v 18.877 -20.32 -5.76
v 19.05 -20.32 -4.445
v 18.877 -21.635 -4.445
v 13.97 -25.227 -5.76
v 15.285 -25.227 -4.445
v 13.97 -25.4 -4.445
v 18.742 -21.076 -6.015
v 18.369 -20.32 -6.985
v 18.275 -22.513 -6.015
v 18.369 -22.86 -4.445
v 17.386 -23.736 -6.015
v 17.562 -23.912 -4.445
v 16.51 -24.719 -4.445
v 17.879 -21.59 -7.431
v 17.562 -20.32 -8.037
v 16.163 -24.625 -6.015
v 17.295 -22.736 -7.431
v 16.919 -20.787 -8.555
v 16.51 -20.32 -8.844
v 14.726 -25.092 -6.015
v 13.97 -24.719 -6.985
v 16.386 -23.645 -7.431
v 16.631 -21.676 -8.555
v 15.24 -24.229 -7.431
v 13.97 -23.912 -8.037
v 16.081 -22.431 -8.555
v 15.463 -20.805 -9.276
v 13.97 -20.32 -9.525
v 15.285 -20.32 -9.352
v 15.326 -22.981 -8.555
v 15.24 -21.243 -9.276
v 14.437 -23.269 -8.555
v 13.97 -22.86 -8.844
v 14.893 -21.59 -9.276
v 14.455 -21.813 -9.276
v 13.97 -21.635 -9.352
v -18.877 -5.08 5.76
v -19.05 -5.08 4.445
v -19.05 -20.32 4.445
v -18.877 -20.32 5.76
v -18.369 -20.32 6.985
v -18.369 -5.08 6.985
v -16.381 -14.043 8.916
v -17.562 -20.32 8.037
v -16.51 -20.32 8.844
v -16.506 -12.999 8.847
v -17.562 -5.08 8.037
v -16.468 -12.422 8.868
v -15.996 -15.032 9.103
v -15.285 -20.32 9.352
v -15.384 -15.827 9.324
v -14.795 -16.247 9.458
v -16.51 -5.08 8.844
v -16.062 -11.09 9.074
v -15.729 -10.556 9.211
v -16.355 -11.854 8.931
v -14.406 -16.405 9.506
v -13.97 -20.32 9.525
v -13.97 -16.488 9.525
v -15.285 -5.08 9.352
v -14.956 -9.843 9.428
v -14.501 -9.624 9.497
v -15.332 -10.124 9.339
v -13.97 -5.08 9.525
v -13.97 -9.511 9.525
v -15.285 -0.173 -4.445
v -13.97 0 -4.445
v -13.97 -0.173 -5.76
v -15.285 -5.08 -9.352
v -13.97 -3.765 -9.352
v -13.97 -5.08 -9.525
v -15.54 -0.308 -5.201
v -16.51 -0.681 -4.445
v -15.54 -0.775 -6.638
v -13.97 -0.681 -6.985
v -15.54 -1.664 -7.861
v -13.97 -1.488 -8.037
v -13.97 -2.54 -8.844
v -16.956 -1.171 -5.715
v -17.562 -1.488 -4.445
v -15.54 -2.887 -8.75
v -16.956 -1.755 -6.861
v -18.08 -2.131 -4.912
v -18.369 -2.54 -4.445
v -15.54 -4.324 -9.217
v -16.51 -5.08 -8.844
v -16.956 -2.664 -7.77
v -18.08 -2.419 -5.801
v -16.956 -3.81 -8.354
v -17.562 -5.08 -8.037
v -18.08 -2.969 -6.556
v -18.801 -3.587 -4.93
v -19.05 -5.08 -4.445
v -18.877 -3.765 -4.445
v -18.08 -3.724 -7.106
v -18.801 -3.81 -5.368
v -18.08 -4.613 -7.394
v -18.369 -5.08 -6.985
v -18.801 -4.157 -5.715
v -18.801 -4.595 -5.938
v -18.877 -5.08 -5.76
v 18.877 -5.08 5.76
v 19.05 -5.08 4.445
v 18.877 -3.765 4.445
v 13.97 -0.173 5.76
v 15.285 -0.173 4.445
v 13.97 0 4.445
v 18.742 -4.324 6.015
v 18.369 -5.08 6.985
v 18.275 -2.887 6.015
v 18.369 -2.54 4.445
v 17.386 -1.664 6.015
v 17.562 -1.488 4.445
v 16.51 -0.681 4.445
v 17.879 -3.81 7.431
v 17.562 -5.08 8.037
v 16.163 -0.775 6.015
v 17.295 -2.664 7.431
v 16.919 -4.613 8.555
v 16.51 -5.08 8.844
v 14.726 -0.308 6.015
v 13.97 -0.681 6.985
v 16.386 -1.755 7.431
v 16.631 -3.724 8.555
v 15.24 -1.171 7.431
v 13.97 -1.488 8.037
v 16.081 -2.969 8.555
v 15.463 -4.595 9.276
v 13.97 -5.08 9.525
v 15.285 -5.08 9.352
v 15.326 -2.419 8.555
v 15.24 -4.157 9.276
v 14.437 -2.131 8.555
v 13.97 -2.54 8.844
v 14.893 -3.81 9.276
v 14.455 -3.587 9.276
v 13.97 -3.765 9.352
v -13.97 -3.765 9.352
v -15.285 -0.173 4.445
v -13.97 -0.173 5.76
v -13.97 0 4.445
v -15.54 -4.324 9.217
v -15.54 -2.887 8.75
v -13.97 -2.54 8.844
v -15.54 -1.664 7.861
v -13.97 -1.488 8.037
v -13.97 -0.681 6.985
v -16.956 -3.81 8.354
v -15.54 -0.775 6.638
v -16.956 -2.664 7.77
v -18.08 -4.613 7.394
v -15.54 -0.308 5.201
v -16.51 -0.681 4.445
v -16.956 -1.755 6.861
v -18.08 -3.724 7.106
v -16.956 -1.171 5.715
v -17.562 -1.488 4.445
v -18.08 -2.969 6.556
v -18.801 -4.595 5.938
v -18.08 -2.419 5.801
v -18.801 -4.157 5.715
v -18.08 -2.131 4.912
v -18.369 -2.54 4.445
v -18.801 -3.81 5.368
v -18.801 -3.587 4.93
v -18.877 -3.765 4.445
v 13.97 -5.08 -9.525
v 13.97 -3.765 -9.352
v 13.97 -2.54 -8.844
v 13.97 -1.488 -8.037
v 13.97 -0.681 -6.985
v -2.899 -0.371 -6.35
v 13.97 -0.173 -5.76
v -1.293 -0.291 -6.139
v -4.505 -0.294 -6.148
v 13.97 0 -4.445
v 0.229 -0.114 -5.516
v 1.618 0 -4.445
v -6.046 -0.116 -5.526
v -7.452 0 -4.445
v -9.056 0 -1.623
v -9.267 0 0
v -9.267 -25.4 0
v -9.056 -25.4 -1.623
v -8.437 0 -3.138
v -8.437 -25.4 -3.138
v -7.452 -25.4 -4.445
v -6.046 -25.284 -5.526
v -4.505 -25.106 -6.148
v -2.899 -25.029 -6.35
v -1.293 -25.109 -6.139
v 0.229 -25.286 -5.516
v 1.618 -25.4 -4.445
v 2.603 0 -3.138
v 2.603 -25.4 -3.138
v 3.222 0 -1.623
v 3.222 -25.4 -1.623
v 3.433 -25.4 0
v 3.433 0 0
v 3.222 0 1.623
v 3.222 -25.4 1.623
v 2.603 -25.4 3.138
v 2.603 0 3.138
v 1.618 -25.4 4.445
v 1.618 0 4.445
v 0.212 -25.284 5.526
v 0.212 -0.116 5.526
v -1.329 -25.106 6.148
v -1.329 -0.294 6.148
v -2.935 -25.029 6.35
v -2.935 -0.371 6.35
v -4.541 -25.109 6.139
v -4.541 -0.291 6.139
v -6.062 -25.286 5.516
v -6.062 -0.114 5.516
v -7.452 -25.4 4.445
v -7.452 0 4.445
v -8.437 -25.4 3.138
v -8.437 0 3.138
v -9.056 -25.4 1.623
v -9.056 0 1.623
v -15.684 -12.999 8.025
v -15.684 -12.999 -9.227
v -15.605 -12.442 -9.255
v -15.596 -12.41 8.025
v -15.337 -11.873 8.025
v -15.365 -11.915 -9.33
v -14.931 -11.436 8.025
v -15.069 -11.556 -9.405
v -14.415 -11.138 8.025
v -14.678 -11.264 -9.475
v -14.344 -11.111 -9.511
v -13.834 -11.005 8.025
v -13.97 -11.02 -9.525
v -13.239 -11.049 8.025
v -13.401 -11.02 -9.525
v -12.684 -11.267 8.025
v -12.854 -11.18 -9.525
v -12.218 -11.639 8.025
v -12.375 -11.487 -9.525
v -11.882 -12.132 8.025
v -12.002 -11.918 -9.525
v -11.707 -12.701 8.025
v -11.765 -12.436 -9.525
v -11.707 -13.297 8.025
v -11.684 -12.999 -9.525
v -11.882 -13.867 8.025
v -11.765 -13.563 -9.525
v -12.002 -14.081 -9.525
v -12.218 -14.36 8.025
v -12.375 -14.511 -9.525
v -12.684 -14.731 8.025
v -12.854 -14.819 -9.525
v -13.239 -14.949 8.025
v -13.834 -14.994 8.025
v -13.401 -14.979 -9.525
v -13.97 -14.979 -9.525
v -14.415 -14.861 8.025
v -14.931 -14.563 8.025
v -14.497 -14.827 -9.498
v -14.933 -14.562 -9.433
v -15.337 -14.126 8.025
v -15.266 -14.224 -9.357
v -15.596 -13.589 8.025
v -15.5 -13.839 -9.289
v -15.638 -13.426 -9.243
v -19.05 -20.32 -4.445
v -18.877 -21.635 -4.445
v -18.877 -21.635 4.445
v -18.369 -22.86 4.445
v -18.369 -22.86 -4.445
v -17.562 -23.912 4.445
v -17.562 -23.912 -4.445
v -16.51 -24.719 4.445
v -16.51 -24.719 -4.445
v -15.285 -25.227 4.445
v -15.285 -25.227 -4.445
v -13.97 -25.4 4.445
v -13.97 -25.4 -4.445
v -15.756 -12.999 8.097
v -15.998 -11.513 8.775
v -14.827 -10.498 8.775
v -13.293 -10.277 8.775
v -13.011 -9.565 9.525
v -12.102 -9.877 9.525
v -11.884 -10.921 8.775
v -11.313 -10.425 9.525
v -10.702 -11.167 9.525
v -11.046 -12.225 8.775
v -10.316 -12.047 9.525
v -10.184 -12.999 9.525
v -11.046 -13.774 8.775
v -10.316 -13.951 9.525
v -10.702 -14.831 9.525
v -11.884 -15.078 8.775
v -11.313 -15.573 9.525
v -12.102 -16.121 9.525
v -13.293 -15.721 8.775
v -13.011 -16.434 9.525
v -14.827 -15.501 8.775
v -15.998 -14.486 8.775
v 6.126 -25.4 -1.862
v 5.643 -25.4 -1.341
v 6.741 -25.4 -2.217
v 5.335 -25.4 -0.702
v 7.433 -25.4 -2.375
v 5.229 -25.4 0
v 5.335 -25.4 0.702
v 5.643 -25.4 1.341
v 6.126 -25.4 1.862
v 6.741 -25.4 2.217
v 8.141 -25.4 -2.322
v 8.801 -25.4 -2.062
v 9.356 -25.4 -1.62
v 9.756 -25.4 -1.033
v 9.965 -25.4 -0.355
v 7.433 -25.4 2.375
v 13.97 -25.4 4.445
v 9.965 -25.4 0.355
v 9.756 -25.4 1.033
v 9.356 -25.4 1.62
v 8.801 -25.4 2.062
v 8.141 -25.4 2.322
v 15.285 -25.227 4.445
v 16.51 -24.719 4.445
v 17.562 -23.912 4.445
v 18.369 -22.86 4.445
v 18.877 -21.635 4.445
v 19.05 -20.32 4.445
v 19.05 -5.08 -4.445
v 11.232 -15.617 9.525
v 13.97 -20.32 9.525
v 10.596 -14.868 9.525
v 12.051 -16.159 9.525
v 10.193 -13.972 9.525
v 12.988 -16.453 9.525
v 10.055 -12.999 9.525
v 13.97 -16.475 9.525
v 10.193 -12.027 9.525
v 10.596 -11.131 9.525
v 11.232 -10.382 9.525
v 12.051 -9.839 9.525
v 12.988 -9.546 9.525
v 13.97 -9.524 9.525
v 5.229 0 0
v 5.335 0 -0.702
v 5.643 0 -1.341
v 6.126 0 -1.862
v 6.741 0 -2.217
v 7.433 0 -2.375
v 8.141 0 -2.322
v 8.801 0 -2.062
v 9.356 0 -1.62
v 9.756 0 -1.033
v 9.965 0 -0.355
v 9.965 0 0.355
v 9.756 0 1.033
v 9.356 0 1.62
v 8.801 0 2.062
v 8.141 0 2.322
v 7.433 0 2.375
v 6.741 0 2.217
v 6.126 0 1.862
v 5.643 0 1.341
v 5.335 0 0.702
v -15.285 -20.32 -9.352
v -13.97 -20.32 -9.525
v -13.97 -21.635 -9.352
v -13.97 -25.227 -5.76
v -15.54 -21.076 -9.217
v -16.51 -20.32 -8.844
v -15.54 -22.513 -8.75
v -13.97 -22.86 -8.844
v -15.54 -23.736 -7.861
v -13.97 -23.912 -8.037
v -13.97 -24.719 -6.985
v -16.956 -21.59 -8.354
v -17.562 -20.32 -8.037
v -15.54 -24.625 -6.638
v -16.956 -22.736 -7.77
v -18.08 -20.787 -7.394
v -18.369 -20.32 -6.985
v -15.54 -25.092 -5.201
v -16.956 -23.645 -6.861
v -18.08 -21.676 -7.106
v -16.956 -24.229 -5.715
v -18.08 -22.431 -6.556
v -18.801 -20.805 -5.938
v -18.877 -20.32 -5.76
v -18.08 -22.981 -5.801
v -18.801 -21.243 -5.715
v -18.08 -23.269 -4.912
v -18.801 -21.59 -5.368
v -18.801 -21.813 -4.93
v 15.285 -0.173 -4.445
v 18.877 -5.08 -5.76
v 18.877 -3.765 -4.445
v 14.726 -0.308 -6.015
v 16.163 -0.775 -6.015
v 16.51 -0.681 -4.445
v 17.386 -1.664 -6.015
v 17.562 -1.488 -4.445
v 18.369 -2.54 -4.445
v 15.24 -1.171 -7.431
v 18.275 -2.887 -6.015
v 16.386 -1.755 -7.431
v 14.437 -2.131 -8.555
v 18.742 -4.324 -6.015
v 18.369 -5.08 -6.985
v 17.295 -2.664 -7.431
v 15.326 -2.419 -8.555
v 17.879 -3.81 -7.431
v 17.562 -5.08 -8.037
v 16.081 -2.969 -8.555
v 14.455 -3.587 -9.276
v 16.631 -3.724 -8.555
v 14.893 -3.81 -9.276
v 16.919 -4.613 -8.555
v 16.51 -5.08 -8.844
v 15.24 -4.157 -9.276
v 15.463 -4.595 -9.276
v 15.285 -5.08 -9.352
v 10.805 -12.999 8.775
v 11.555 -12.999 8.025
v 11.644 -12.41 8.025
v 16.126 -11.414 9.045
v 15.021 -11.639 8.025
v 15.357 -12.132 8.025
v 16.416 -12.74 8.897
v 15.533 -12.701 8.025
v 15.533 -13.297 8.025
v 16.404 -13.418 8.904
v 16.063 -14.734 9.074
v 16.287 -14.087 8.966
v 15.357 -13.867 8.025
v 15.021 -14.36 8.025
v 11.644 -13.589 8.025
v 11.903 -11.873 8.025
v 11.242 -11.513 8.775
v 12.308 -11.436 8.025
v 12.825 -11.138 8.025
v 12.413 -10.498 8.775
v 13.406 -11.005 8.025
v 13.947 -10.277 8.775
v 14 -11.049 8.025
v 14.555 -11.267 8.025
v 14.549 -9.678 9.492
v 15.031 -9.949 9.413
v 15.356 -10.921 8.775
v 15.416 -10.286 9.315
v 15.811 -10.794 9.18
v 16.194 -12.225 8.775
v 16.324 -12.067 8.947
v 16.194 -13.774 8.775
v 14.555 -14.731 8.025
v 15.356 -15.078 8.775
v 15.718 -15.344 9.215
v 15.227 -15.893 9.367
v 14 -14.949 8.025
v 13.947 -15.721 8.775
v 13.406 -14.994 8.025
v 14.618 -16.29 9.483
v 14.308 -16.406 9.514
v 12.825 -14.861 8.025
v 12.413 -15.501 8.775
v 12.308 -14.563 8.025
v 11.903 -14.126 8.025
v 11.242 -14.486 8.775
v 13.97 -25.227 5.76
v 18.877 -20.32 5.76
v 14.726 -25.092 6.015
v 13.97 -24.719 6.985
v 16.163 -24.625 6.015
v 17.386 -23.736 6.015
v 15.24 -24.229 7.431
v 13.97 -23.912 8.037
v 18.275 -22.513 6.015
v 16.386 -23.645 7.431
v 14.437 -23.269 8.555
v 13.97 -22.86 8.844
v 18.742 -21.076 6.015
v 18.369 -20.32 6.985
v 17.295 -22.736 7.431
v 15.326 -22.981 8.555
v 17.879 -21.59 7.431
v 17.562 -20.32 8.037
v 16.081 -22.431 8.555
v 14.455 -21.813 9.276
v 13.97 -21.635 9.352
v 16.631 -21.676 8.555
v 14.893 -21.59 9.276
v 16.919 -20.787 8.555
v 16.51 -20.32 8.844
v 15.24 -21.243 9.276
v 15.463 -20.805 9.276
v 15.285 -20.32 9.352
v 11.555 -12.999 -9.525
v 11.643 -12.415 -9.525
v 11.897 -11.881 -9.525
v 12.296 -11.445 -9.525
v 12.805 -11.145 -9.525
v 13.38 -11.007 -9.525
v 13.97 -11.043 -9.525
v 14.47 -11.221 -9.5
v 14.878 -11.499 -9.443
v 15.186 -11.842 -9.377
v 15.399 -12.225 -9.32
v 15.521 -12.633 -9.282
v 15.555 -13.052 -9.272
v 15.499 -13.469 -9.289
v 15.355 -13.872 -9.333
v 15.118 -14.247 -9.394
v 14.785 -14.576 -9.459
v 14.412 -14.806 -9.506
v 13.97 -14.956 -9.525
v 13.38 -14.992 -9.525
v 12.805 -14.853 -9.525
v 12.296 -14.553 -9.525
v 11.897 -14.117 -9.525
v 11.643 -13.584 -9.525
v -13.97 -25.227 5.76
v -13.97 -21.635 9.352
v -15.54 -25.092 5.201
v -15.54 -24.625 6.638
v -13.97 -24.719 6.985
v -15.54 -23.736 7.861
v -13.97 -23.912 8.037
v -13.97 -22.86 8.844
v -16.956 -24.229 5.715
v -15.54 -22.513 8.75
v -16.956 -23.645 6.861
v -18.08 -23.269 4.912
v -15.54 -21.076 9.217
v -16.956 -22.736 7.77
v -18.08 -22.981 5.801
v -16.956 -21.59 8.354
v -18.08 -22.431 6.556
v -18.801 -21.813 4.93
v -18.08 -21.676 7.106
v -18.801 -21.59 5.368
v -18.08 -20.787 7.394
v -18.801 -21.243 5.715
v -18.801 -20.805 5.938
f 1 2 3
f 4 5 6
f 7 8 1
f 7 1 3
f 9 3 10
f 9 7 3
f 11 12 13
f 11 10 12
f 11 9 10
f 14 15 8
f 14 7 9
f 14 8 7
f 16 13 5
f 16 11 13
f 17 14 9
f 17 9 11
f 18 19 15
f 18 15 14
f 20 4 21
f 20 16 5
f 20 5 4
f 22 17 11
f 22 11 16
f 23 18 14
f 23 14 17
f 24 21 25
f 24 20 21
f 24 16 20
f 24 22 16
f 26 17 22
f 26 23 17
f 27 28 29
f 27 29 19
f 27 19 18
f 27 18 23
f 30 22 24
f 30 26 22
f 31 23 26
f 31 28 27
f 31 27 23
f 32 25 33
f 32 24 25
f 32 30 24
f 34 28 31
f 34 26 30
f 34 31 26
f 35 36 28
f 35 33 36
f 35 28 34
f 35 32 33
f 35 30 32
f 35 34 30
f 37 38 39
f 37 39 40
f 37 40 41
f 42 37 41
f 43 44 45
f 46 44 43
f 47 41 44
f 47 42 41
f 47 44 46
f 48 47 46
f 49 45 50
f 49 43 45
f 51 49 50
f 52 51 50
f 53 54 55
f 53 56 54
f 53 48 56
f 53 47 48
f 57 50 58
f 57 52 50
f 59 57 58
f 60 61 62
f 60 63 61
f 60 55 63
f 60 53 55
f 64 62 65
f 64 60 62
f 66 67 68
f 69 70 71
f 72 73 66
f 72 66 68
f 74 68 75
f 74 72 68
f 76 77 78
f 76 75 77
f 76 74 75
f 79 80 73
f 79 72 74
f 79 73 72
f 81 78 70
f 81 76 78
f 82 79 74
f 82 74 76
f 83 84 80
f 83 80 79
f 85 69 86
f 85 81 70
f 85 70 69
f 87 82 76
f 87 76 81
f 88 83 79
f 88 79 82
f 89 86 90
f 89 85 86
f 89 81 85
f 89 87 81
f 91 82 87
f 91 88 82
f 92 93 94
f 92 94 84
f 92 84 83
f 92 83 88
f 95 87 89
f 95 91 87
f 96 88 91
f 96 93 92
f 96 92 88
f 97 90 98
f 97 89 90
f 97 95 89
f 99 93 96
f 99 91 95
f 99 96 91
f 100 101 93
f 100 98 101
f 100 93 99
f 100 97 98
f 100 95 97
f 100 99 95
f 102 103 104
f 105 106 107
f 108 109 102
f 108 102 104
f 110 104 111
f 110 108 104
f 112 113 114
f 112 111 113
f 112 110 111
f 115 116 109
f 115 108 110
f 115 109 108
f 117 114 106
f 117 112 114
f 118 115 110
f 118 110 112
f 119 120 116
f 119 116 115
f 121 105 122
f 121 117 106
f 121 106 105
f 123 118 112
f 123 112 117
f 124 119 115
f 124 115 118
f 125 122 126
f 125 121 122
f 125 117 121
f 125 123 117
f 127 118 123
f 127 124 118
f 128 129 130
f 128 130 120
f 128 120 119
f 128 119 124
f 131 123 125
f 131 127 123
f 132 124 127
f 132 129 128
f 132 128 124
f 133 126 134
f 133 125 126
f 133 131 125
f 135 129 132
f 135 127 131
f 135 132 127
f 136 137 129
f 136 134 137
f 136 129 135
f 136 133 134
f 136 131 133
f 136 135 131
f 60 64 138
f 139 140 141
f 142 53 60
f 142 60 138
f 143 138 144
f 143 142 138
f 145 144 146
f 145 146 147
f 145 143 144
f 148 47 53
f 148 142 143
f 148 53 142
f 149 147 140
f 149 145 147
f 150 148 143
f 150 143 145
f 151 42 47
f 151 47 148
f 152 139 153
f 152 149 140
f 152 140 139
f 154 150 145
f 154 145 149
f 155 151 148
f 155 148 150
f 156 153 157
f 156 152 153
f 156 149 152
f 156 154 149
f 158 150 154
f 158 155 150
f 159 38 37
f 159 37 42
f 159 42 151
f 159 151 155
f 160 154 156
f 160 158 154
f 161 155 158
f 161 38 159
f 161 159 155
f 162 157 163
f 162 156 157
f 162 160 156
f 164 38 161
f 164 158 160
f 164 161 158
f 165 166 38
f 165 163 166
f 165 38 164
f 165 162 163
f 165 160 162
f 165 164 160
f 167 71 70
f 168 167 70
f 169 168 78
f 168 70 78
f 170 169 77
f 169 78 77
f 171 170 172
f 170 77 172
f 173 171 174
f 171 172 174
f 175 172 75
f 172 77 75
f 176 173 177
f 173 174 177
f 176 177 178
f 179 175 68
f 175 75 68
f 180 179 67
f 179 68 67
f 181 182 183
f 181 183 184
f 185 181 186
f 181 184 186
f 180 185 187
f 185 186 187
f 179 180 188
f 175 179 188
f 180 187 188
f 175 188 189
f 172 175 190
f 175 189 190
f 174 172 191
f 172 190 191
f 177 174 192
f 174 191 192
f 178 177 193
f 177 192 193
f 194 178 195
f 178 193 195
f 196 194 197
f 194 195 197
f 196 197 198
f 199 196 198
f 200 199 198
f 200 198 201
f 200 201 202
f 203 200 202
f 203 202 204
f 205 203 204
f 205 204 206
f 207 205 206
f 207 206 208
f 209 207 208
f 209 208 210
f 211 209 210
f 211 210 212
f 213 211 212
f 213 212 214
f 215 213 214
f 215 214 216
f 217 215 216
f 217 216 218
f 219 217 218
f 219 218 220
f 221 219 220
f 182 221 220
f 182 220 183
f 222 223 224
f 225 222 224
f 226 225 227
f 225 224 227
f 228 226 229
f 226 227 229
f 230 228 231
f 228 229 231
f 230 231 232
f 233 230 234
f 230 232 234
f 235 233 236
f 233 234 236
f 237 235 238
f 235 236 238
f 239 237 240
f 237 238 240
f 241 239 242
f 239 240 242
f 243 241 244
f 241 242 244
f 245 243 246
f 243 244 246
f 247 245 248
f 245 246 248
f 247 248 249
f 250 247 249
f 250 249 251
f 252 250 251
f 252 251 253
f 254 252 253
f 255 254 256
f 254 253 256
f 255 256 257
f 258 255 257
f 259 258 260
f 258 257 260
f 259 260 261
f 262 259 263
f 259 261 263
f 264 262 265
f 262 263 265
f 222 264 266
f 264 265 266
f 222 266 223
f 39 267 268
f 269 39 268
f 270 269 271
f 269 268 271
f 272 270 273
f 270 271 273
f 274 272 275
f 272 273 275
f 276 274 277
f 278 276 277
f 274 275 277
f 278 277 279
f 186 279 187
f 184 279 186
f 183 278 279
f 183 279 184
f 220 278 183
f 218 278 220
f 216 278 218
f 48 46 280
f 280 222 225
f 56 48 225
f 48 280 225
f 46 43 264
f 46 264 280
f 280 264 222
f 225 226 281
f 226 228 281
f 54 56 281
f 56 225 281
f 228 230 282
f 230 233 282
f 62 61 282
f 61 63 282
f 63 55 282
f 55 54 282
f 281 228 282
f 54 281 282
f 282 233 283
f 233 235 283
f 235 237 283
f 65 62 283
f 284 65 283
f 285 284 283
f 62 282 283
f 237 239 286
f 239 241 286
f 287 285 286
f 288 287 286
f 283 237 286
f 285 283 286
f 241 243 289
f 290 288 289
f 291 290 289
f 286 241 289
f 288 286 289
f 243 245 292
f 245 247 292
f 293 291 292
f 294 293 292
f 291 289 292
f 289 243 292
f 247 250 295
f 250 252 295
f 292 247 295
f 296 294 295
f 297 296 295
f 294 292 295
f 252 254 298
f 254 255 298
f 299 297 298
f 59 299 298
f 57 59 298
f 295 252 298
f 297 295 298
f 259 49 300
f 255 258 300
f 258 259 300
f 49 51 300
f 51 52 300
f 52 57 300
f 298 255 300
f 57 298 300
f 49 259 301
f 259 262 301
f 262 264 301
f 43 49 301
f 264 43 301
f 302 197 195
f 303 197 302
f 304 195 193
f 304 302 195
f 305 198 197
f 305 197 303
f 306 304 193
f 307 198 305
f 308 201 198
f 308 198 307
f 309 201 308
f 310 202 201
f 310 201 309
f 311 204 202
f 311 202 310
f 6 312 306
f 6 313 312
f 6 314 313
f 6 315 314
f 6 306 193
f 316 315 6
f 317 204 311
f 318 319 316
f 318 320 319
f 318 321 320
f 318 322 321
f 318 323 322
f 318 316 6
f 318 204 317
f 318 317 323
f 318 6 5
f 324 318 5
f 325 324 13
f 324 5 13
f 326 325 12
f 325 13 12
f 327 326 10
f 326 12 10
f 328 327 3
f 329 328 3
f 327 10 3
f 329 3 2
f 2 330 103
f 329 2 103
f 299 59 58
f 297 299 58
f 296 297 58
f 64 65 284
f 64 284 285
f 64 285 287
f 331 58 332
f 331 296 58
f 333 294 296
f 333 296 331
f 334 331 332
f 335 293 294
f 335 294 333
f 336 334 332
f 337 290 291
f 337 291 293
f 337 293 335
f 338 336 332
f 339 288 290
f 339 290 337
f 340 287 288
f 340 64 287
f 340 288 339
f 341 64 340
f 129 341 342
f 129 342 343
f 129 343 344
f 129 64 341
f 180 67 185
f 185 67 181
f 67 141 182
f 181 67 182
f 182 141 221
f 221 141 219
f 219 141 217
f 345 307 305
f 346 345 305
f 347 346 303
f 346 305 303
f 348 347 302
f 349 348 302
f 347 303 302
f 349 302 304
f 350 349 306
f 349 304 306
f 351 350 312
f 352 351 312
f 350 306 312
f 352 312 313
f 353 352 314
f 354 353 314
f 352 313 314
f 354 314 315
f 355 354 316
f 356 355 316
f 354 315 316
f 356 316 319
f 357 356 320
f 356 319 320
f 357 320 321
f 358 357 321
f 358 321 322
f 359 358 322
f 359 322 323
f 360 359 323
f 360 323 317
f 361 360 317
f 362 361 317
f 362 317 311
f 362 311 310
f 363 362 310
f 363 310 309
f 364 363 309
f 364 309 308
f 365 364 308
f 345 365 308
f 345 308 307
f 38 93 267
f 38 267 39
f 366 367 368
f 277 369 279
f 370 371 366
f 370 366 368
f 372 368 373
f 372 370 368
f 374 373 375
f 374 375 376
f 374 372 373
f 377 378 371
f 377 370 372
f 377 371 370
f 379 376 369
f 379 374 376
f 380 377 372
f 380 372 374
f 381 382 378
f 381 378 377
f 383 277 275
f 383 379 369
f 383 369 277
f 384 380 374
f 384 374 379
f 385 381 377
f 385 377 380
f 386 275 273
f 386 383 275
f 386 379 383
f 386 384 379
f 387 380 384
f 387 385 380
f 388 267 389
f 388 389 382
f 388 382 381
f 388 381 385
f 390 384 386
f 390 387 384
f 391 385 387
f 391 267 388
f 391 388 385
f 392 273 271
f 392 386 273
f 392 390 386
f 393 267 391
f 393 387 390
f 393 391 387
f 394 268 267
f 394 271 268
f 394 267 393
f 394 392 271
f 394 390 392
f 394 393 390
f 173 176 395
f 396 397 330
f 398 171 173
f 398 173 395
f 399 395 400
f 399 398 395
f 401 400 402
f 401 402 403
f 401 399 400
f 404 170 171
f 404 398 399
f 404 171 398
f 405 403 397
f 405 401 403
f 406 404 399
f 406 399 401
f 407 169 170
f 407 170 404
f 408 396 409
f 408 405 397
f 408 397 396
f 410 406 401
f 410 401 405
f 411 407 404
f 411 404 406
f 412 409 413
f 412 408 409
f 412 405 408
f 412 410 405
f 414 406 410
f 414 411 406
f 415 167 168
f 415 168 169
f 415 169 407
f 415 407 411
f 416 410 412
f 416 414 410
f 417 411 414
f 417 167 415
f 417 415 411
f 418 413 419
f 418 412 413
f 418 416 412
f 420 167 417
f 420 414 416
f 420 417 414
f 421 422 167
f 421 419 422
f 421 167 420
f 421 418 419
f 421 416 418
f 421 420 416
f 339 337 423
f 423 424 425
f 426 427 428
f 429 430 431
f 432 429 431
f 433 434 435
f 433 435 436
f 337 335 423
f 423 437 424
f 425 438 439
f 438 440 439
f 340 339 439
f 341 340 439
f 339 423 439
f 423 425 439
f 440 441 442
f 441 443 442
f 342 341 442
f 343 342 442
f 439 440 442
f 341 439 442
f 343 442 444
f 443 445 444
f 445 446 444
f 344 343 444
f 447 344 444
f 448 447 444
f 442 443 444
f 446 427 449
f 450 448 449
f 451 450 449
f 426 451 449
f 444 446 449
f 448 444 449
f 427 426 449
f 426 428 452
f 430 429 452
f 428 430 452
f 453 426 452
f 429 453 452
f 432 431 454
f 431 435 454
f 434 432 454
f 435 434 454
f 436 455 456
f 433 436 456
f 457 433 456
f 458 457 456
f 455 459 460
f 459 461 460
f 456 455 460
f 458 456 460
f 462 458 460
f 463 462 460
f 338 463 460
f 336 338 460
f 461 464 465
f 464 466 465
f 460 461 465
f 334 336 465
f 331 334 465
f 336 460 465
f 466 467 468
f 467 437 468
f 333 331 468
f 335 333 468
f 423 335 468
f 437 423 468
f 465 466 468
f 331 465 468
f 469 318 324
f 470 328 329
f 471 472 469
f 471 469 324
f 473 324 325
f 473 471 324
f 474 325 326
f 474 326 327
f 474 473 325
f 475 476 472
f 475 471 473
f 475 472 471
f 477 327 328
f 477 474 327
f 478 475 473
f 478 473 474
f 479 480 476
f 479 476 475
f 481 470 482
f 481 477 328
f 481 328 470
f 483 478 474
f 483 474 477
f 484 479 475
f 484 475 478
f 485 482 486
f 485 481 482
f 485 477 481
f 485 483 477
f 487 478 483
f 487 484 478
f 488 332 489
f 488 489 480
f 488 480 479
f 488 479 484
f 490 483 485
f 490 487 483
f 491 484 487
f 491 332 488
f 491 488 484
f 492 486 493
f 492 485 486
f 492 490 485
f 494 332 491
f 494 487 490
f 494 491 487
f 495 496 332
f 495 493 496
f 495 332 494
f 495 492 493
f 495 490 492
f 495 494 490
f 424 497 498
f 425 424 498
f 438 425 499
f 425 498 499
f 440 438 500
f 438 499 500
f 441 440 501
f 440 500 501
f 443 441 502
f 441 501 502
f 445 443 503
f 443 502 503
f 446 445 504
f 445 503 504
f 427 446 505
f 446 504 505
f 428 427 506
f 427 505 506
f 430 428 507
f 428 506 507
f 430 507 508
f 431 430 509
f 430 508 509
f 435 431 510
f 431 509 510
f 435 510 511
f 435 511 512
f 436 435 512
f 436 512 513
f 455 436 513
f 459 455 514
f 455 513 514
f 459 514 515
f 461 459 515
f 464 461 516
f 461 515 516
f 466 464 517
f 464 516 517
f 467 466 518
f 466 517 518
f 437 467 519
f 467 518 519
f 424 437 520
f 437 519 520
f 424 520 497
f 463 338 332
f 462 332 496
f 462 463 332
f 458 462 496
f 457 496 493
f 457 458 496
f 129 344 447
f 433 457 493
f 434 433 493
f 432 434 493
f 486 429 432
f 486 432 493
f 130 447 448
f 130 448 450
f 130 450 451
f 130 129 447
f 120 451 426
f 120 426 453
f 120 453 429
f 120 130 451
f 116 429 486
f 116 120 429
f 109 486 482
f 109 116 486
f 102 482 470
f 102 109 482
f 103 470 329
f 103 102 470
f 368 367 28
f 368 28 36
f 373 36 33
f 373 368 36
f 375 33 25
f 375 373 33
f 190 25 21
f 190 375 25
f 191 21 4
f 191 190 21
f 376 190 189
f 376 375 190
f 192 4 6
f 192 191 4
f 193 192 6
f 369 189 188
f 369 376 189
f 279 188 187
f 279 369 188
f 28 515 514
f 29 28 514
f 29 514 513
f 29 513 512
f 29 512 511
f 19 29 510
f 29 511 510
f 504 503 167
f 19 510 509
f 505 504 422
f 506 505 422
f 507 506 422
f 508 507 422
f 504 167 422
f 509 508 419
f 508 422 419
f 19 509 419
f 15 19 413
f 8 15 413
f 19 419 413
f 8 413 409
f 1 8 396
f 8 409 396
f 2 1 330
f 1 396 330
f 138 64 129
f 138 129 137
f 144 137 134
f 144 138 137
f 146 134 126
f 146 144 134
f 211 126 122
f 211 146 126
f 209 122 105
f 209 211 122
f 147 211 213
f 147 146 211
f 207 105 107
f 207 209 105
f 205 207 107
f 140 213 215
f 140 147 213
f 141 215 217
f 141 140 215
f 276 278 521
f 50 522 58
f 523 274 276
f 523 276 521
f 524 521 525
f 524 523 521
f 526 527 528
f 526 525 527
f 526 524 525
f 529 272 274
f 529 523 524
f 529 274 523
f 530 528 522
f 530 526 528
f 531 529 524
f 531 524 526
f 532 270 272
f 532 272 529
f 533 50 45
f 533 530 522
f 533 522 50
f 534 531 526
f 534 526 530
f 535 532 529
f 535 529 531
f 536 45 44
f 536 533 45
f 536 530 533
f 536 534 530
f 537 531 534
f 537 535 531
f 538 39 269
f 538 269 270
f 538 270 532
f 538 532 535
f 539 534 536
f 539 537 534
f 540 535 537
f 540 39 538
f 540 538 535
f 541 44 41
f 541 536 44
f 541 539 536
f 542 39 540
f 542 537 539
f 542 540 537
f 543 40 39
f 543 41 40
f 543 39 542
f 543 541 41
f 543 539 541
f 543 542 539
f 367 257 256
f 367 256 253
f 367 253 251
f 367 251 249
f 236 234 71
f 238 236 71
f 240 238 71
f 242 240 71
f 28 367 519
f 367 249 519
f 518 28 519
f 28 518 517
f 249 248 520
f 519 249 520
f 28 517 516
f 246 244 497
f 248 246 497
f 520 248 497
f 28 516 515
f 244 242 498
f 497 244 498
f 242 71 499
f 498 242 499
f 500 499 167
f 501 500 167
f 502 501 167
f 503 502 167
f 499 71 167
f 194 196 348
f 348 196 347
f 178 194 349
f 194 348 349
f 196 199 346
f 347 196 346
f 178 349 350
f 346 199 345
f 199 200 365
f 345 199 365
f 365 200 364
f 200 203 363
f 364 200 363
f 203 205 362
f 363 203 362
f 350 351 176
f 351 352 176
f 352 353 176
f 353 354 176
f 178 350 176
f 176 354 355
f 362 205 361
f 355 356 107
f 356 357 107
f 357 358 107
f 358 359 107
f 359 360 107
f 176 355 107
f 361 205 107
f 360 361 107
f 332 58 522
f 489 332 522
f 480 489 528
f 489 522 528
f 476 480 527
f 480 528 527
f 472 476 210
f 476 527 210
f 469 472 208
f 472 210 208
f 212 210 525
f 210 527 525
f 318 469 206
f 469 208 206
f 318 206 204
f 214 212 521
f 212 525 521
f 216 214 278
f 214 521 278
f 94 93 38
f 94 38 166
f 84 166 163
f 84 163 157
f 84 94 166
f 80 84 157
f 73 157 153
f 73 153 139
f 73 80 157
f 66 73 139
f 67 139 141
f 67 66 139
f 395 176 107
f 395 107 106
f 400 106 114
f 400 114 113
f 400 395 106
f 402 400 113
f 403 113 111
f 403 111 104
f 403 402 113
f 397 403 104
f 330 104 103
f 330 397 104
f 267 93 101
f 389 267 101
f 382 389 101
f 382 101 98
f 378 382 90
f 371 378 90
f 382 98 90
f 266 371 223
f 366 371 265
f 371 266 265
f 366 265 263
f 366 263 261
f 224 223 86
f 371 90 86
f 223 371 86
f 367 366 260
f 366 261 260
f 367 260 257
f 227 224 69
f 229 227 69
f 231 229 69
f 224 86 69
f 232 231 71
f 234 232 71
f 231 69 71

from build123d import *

# Parameters (mm, degrees)
F0_W           = 38.1
F0_H           = 19.05
F1_DEPTH       = 25.4
F2_D           = 12.7
F3_D           = 4.7625
F5_D           = 4
F5_CSINK_D     = 7
F5_CSINK_ANGLE = 90
F6_T1_DEPTH    = 27.94
F6_T3_DEPTH    = 15.24
F6_T5_DEPTH    = 8.89
F6_S9_W        = 5.08
F6_S9_H        = 5.08
F6_T10_DEPTH   = 5.08
F6_S15_W       = 5.08
F6_S15_H       = 5.08
F6_T16_DEPTH   = 5.08
F6_S21_W       = 5.08
F6_S21_H       = 5.08
F6_T22_DEPTH   = 5.08
F6_S27_W       = 5.08
F6_S27_H       = 5.08
F6_T28_DEPTH   = 5.08
F6_S33_W       = 5.08
F6_S33_H       = 5.08
F6_T34_DEPTH   = 5.08
F6_S39_W       = 5.08
F6_S39_H       = 5.08
F6_T40_DEPTH   = 5.08
F6_S45_W       = 5.08
F6_S45_H       = 5.08
F6_T46_DEPTH   = 5.08
F6_S51_W       = 5.08
F6_S51_H       = 5.08
F6_T52_DEPTH   = 5.08


# Not quite as in the source:
# - a fillet or chamfer that OpenCascade refuses, or shapes differently, is made with other operations: its cross-section is extruded or revolved along the edge and cut away or added


with BuildPart() as f1:
    # F0 (on Front) → F1 (new body)
    with BuildSketch(Plane.XZ):
        Rectangle(F0_W, F0_H)
    extrude(amount=F1_DEPTH)

    # F2 (through all)
    with Locations(Plane(origin=(0, 0, 0), x_dir=(1, 0, 0), z_dir=(0, 1, 0))):
        with Locations((-2.9169023037, 0)):
            Hole(F2_D / 2)

    # F3 (through all)
    with Locations(Plane(origin=(0, 0, 0), x_dir=(1, 0, 0), z_dir=(0, 1, 0))):
        with Locations((7.6106409542, 0)):
            Hole(F3_D / 2)

    # F5 (through all)
    with Locations(Plane.XY.offset(9.525)):
        with Locations((-13.6843686923, -12.9993055016), (13.5552566499, -12.9993055016)):
            CounterSinkHole(F5_D / 2, F5_CSINK_D / 2, counter_sink_angle=F5_CSINK_ANGLE)

    # F6: fillet of radius 5.08 on 12 edges, made by hand

    # F6_s2 → F6_t1 (cut)
    with BuildSketch(Plane.YZ.offset(-13.97)):
        with BuildLine():
            ThreePointArc((-5.08, 9.525), (-1.4878975516, 8.0371024484), (0, 4.445))
            Line((0, 4.445), (0, 9.525))
            Line((0, 9.525), (-5.08, 9.525))
        make_face()
        with BuildLine():
            ThreePointArc((-20.32, 9.525), (-23.9121024484, 8.0371024484), (-25.4, 4.445))
            Line((-25.4, 4.445), (-25.4, 9.525))
            Line((-25.4, 9.525), (-20.32, 9.525))
        make_face()
        with BuildLine():
            ThreePointArc((-20.32, -9.525), (-23.9121024484, -8.0371024484), (-25.4, -4.445))
            Line((-25.4, -4.445), (-25.4, -9.525))
            Line((-25.4, -9.525), (-20.32, -9.525))
        make_face()
        with BuildLine():
            ThreePointArc((-5.08, -9.525), (-1.4878975516, -8.0371024484), (0, -4.445))
            Line((0, -4.445), (0, -9.525))
            Line((0, -9.525), (-5.08, -9.525))
        make_face()
    extrude(amount=F6_T1_DEPTH, mode=Mode.SUBTRACT)

    # F6_s4 → F6_t3 (cut)
    with BuildSketch(Plane.XZ.offset(5.08)):
        with BuildLine():
            ThreePointArc((13.97, -9.525), (17.5621024484, -8.0371024484), (19.05, -4.445))
            Line((19.05, -4.445), (19.05, -9.525))
            Line((19.05, -9.525), (13.97, -9.525))
        make_face()
        with BuildLine():
            ThreePointArc((13.97, 9.525), (17.5621024484, 8.0371024484), (19.05, 4.445))
            Line((19.05, 4.445), (19.05, 9.525))
            Line((19.05, 9.525), (13.97, 9.525))
        make_face()
        with BuildLine():
            ThreePointArc((-19.05, 4.445), (-17.5621024484, 8.0371024484), (-13.97, 9.525))
            Line((-13.97, 9.525), (-19.05, 9.525))
            Line((-19.05, 9.525), (-19.05, 4.445))
        make_face()
        with BuildLine():
            ThreePointArc((-19.05, -4.445), (-17.5621024484, -8.0371024484), (-13.97, -9.525))
            Line((-13.97, -9.525), (-19.05, -9.525))
            Line((-19.05, -9.525), (-19.05, -4.445))
        make_face()
    extrude(amount=F6_T3_DEPTH, mode=Mode.SUBTRACT)

    # F6_s6 → F6_t5 (cut)
    with BuildSketch(Plane.XY.offset(-4.445)):
        with BuildLine():
            ThreePointArc((13.97, 0), (17.5621024484, -1.4878975516), (19.05, -5.08))
            Line((19.05, -5.08), (19.05, 0))
            Line((19.05, 0), (13.97, 0))
        make_face()
        with BuildLine():
            ThreePointArc((13.97, -25.4), (17.5621024484, -23.9121024484), (19.05, -20.32))
            Line((19.05, -20.32), (19.05, -25.4))
            Line((19.05, -25.4), (13.97, -25.4))
        make_face()
        with BuildLine():
            ThreePointArc((-19.05, -5.08), (-17.5621024484, -1.4878975516), (-13.97, 0))
            Line((-13.97, 0), (-19.05, 0))
            Line((-19.05, 0), (-19.05, -5.08))
        make_face()
        with BuildLine():
            ThreePointArc((-19.05, -20.32), (-17.5621024484, -23.9121024484), (-13.97, -25.4))
            Line((-13.97, -25.4), (-19.05, -25.4))
            Line((-19.05, -25.4), (-19.05, -20.32))
        make_face()
    extrude(amount=F6_T5_DEPTH, mode=Mode.SUBTRACT)


with BuildPart() as f6_tool8:
    # F6_s9 → F6_t10 (new body)
    with BuildSketch(Plane.XY.offset(4.445)):
        with Locations((16.51, -2.54)):
            Rectangle(F6_S9_W, F6_S9_H)
    extrude(amount=F6_T10_DEPTH)

    # F6_s11 → F6_t12 (revolve, cut)
    with BuildSketch(Plane(origin=(13.97, -5.08, 4.445), x_dir=(-0.7071067812, -0.7071067812, 0), z_dir=(-0.7071067812, 0.7071067812, 0))):
        with BuildLine():
            ThreePointArc((0, -5.08), (5.08, 0), (0, 5.08))
            Line((0, 5.08), (0, -5.08))
        make_face()
    revolve(axis=Axis((13.97, -5.08, 4.445), (0, 0, 1)), mode=Mode.SUBTRACT)


with BuildPart() as f1_1:
    add(f1.part)

    # F6_t7: cut F6_tool8
    add(f6_tool8.part, mode=Mode.SUBTRACT)


with BuildPart() as f6_tool14:
    # F6_s15 → F6_t16 (new body)
    with BuildSketch(Plane.YZ.offset(-13.97)):
        with Locations((-2.54, 6.985)):
            Rectangle(F6_S15_W, F6_S15_H)
    extrude(amount=-F6_T16_DEPTH)

    # F6_s17 → F6_t18 (revolve, cut)
    with BuildSketch(Plane(origin=(-13.97, -5.08, 4.445), x_dir=(0, -0.7071067812, -0.7071067812), z_dir=(0, 0.7071067812, -0.7071067812))):
        with BuildLine():
            ThreePointArc((0, -5.08), (5.08, 0), (0, 5.08))
            Line((0, 5.08), (0, -5.08))
        make_face()
    revolve(axis=Axis((-13.97, -5.08, 4.445), (-1, 0, 0)), mode=Mode.SUBTRACT)


with BuildPart() as f1_2:
    add(f1_1.part)

    # F6_t13: cut F6_tool14
    add(f6_tool14.part, mode=Mode.SUBTRACT)


with BuildPart() as f6_tool20:
    # F6_s21 → F6_t22 (new body)
    with BuildSketch(Plane.XY.offset(4.445)):
        with Locations((16.51, -22.86)):
            Rectangle(F6_S21_W, F6_S21_H)
    extrude(amount=F6_T22_DEPTH)

    # F6_s23 → F6_t24 (revolve, cut)
    with BuildSketch(Plane(origin=(13.97, -20.32, 4.445), x_dir=(-0.7071067812, 0.7071067812, 0), z_dir=(0.7071067812, 0.7071067812, 0))):
        with BuildLine():
            ThreePointArc((0, -5.08), (5.08, 0), (0, 5.08))
            Line((0, 5.08), (0, -5.08))
        make_face()
    revolve(axis=Axis((13.97, -20.32, 4.445), (0, 0, 1)), mode=Mode.SUBTRACT)


with BuildPart() as f1_3:
    add(f1_2.part)

    # F6_t19: cut F6_tool20
    add(f6_tool20.part, mode=Mode.SUBTRACT)


with BuildPart() as f6_tool26:
    # F6_s27 → F6_t28 (new body)
    with BuildSketch(Plane.YZ.offset(-13.97)):
        with Locations((-22.86, 6.985)):
            Rectangle(F6_S27_W, F6_S27_H)
    extrude(amount=-F6_T28_DEPTH)

    # F6_s29 → F6_t30 (revolve, cut)
    with BuildSketch(Plane(origin=(-13.97, -20.32, 4.445), x_dir=(0, 0.7071067812, -0.7071067812), z_dir=(0, 0.7071067812, 0.7071067812))):
        with BuildLine():
            ThreePointArc((0, -5.08), (5.08, 0), (0, 5.08))
            Line((0, 5.08), (0, -5.08))
        make_face()
    revolve(axis=Axis((-13.97, -20.32, 4.445), (-1, 0, 0)), mode=Mode.SUBTRACT)


with BuildPart() as f1_4:
    add(f1_3.part)

    # F6_t25: cut F6_tool26
    add(f6_tool26.part, mode=Mode.SUBTRACT)


with BuildPart() as f6_tool32:
    # F6_s33 → F6_t34 (new body)
    with BuildSketch(Plane.YZ.offset(-13.97)):
        with Locations((-22.86, -6.985)):
            Rectangle(F6_S33_W, F6_S33_H)
    extrude(amount=-F6_T34_DEPTH)

    # F6_s35 → F6_t36 (revolve, cut)
    with BuildSketch(Plane(origin=(-13.97, -20.32, -4.445), x_dir=(0, 0.7071067812, 0.7071067812), z_dir=(0, -0.7071067812, 0.7071067812))):
        with BuildLine():
            ThreePointArc((0, -5.08), (5.08, 0), (0, 5.08))
            Line((0, 5.08), (0, -5.08))
        make_face()
    revolve(axis=Axis((-13.97, -20.32, -4.445), (-1, 0, 0)), mode=Mode.SUBTRACT)


with BuildPart() as f1_5:
    add(f1_4.part)

    # F6_t31: cut F6_tool32
    add(f6_tool32.part, mode=Mode.SUBTRACT)


with BuildPart() as f6_tool38:
    # F6_s39 → F6_t40 (new body)
    with BuildSketch(Plane.XY.offset(-4.445)):
        with Locations((16.51, -22.86)):
            Rectangle(F6_S39_W, F6_S39_H)
    extrude(amount=-F6_T40_DEPTH)

    # F6_s41 → F6_t42 (revolve, cut)
    with BuildSketch(Plane(origin=(13.97, -20.32, -4.445), x_dir=(-0.7071067812, 0.7071067812, 0), z_dir=(-0.7071067812, -0.7071067812, 0))):
        with BuildLine():
            ThreePointArc((0, -5.08), (5.08, 0), (0, 5.08))
            Line((0, 5.08), (0, -5.08))
        make_face()
    revolve(axis=Axis((13.97, -20.32, -4.445), (0, 0, -1)), mode=Mode.SUBTRACT)


with BuildPart() as f1_6:
    add(f1_5.part)

    # F6_t37: cut F6_tool38
    add(f6_tool38.part, mode=Mode.SUBTRACT)


with BuildPart() as f6_tool44:
    # F6_s45 → F6_t46 (new body)
    with BuildSketch(Plane.YZ.offset(-13.97)):
        with Locations((-2.54, -6.985)):
            Rectangle(F6_S45_W, F6_S45_H)
    extrude(amount=-F6_T46_DEPTH)

    # F6_s47 → F6_t48 (revolve, cut)
    with BuildSketch(Plane(origin=(-13.97, -5.08, -4.445), x_dir=(0, -0.7071067812, 0.7071067812), z_dir=(0, -0.7071067812, -0.7071067812))):
        with BuildLine():
            ThreePointArc((0, -5.08), (5.08, 0), (0, 5.08))
            Line((0, 5.08), (0, -5.08))
        make_face()
    revolve(axis=Axis((-13.97, -5.08, -4.445), (-1, 0, 0)), mode=Mode.SUBTRACT)


with BuildPart() as f1_7:
    add(f1_6.part)

    # F6_t43: cut F6_tool44
    add(f6_tool44.part, mode=Mode.SUBTRACT)


with BuildPart() as f6_tool50:
    # F6_s51 → F6_t52 (new body)
    with BuildSketch(Plane.XY.offset(-4.445)):
        with Locations((16.51, -2.54)):
            Rectangle(F6_S51_W, F6_S51_H)
    extrude(amount=-F6_T52_DEPTH)

    # F6_s53 → F6_t54 (revolve, cut)
    with BuildSketch(Plane(origin=(13.97, -5.08, -4.445), x_dir=(-0.7071067812, -0.7071067812, 0), z_dir=(0.7071067812, -0.7071067812, 0))):
        with BuildLine():
            ThreePointArc((0, -5.08), (5.08, 0), (0, 5.08))
            Line((0, 5.08), (0, -5.08))
        make_face()
    revolve(axis=Axis((13.97, -5.08, -4.445), (0, 0, -1)), mode=Mode.SUBTRACT)


with BuildPart() as f1_8:
    add(f1_7.part)

    # F6_t49: cut F6_tool50
    add(f6_tool50.part, mode=Mode.SUBTRACT)


solid = f1_8.part
